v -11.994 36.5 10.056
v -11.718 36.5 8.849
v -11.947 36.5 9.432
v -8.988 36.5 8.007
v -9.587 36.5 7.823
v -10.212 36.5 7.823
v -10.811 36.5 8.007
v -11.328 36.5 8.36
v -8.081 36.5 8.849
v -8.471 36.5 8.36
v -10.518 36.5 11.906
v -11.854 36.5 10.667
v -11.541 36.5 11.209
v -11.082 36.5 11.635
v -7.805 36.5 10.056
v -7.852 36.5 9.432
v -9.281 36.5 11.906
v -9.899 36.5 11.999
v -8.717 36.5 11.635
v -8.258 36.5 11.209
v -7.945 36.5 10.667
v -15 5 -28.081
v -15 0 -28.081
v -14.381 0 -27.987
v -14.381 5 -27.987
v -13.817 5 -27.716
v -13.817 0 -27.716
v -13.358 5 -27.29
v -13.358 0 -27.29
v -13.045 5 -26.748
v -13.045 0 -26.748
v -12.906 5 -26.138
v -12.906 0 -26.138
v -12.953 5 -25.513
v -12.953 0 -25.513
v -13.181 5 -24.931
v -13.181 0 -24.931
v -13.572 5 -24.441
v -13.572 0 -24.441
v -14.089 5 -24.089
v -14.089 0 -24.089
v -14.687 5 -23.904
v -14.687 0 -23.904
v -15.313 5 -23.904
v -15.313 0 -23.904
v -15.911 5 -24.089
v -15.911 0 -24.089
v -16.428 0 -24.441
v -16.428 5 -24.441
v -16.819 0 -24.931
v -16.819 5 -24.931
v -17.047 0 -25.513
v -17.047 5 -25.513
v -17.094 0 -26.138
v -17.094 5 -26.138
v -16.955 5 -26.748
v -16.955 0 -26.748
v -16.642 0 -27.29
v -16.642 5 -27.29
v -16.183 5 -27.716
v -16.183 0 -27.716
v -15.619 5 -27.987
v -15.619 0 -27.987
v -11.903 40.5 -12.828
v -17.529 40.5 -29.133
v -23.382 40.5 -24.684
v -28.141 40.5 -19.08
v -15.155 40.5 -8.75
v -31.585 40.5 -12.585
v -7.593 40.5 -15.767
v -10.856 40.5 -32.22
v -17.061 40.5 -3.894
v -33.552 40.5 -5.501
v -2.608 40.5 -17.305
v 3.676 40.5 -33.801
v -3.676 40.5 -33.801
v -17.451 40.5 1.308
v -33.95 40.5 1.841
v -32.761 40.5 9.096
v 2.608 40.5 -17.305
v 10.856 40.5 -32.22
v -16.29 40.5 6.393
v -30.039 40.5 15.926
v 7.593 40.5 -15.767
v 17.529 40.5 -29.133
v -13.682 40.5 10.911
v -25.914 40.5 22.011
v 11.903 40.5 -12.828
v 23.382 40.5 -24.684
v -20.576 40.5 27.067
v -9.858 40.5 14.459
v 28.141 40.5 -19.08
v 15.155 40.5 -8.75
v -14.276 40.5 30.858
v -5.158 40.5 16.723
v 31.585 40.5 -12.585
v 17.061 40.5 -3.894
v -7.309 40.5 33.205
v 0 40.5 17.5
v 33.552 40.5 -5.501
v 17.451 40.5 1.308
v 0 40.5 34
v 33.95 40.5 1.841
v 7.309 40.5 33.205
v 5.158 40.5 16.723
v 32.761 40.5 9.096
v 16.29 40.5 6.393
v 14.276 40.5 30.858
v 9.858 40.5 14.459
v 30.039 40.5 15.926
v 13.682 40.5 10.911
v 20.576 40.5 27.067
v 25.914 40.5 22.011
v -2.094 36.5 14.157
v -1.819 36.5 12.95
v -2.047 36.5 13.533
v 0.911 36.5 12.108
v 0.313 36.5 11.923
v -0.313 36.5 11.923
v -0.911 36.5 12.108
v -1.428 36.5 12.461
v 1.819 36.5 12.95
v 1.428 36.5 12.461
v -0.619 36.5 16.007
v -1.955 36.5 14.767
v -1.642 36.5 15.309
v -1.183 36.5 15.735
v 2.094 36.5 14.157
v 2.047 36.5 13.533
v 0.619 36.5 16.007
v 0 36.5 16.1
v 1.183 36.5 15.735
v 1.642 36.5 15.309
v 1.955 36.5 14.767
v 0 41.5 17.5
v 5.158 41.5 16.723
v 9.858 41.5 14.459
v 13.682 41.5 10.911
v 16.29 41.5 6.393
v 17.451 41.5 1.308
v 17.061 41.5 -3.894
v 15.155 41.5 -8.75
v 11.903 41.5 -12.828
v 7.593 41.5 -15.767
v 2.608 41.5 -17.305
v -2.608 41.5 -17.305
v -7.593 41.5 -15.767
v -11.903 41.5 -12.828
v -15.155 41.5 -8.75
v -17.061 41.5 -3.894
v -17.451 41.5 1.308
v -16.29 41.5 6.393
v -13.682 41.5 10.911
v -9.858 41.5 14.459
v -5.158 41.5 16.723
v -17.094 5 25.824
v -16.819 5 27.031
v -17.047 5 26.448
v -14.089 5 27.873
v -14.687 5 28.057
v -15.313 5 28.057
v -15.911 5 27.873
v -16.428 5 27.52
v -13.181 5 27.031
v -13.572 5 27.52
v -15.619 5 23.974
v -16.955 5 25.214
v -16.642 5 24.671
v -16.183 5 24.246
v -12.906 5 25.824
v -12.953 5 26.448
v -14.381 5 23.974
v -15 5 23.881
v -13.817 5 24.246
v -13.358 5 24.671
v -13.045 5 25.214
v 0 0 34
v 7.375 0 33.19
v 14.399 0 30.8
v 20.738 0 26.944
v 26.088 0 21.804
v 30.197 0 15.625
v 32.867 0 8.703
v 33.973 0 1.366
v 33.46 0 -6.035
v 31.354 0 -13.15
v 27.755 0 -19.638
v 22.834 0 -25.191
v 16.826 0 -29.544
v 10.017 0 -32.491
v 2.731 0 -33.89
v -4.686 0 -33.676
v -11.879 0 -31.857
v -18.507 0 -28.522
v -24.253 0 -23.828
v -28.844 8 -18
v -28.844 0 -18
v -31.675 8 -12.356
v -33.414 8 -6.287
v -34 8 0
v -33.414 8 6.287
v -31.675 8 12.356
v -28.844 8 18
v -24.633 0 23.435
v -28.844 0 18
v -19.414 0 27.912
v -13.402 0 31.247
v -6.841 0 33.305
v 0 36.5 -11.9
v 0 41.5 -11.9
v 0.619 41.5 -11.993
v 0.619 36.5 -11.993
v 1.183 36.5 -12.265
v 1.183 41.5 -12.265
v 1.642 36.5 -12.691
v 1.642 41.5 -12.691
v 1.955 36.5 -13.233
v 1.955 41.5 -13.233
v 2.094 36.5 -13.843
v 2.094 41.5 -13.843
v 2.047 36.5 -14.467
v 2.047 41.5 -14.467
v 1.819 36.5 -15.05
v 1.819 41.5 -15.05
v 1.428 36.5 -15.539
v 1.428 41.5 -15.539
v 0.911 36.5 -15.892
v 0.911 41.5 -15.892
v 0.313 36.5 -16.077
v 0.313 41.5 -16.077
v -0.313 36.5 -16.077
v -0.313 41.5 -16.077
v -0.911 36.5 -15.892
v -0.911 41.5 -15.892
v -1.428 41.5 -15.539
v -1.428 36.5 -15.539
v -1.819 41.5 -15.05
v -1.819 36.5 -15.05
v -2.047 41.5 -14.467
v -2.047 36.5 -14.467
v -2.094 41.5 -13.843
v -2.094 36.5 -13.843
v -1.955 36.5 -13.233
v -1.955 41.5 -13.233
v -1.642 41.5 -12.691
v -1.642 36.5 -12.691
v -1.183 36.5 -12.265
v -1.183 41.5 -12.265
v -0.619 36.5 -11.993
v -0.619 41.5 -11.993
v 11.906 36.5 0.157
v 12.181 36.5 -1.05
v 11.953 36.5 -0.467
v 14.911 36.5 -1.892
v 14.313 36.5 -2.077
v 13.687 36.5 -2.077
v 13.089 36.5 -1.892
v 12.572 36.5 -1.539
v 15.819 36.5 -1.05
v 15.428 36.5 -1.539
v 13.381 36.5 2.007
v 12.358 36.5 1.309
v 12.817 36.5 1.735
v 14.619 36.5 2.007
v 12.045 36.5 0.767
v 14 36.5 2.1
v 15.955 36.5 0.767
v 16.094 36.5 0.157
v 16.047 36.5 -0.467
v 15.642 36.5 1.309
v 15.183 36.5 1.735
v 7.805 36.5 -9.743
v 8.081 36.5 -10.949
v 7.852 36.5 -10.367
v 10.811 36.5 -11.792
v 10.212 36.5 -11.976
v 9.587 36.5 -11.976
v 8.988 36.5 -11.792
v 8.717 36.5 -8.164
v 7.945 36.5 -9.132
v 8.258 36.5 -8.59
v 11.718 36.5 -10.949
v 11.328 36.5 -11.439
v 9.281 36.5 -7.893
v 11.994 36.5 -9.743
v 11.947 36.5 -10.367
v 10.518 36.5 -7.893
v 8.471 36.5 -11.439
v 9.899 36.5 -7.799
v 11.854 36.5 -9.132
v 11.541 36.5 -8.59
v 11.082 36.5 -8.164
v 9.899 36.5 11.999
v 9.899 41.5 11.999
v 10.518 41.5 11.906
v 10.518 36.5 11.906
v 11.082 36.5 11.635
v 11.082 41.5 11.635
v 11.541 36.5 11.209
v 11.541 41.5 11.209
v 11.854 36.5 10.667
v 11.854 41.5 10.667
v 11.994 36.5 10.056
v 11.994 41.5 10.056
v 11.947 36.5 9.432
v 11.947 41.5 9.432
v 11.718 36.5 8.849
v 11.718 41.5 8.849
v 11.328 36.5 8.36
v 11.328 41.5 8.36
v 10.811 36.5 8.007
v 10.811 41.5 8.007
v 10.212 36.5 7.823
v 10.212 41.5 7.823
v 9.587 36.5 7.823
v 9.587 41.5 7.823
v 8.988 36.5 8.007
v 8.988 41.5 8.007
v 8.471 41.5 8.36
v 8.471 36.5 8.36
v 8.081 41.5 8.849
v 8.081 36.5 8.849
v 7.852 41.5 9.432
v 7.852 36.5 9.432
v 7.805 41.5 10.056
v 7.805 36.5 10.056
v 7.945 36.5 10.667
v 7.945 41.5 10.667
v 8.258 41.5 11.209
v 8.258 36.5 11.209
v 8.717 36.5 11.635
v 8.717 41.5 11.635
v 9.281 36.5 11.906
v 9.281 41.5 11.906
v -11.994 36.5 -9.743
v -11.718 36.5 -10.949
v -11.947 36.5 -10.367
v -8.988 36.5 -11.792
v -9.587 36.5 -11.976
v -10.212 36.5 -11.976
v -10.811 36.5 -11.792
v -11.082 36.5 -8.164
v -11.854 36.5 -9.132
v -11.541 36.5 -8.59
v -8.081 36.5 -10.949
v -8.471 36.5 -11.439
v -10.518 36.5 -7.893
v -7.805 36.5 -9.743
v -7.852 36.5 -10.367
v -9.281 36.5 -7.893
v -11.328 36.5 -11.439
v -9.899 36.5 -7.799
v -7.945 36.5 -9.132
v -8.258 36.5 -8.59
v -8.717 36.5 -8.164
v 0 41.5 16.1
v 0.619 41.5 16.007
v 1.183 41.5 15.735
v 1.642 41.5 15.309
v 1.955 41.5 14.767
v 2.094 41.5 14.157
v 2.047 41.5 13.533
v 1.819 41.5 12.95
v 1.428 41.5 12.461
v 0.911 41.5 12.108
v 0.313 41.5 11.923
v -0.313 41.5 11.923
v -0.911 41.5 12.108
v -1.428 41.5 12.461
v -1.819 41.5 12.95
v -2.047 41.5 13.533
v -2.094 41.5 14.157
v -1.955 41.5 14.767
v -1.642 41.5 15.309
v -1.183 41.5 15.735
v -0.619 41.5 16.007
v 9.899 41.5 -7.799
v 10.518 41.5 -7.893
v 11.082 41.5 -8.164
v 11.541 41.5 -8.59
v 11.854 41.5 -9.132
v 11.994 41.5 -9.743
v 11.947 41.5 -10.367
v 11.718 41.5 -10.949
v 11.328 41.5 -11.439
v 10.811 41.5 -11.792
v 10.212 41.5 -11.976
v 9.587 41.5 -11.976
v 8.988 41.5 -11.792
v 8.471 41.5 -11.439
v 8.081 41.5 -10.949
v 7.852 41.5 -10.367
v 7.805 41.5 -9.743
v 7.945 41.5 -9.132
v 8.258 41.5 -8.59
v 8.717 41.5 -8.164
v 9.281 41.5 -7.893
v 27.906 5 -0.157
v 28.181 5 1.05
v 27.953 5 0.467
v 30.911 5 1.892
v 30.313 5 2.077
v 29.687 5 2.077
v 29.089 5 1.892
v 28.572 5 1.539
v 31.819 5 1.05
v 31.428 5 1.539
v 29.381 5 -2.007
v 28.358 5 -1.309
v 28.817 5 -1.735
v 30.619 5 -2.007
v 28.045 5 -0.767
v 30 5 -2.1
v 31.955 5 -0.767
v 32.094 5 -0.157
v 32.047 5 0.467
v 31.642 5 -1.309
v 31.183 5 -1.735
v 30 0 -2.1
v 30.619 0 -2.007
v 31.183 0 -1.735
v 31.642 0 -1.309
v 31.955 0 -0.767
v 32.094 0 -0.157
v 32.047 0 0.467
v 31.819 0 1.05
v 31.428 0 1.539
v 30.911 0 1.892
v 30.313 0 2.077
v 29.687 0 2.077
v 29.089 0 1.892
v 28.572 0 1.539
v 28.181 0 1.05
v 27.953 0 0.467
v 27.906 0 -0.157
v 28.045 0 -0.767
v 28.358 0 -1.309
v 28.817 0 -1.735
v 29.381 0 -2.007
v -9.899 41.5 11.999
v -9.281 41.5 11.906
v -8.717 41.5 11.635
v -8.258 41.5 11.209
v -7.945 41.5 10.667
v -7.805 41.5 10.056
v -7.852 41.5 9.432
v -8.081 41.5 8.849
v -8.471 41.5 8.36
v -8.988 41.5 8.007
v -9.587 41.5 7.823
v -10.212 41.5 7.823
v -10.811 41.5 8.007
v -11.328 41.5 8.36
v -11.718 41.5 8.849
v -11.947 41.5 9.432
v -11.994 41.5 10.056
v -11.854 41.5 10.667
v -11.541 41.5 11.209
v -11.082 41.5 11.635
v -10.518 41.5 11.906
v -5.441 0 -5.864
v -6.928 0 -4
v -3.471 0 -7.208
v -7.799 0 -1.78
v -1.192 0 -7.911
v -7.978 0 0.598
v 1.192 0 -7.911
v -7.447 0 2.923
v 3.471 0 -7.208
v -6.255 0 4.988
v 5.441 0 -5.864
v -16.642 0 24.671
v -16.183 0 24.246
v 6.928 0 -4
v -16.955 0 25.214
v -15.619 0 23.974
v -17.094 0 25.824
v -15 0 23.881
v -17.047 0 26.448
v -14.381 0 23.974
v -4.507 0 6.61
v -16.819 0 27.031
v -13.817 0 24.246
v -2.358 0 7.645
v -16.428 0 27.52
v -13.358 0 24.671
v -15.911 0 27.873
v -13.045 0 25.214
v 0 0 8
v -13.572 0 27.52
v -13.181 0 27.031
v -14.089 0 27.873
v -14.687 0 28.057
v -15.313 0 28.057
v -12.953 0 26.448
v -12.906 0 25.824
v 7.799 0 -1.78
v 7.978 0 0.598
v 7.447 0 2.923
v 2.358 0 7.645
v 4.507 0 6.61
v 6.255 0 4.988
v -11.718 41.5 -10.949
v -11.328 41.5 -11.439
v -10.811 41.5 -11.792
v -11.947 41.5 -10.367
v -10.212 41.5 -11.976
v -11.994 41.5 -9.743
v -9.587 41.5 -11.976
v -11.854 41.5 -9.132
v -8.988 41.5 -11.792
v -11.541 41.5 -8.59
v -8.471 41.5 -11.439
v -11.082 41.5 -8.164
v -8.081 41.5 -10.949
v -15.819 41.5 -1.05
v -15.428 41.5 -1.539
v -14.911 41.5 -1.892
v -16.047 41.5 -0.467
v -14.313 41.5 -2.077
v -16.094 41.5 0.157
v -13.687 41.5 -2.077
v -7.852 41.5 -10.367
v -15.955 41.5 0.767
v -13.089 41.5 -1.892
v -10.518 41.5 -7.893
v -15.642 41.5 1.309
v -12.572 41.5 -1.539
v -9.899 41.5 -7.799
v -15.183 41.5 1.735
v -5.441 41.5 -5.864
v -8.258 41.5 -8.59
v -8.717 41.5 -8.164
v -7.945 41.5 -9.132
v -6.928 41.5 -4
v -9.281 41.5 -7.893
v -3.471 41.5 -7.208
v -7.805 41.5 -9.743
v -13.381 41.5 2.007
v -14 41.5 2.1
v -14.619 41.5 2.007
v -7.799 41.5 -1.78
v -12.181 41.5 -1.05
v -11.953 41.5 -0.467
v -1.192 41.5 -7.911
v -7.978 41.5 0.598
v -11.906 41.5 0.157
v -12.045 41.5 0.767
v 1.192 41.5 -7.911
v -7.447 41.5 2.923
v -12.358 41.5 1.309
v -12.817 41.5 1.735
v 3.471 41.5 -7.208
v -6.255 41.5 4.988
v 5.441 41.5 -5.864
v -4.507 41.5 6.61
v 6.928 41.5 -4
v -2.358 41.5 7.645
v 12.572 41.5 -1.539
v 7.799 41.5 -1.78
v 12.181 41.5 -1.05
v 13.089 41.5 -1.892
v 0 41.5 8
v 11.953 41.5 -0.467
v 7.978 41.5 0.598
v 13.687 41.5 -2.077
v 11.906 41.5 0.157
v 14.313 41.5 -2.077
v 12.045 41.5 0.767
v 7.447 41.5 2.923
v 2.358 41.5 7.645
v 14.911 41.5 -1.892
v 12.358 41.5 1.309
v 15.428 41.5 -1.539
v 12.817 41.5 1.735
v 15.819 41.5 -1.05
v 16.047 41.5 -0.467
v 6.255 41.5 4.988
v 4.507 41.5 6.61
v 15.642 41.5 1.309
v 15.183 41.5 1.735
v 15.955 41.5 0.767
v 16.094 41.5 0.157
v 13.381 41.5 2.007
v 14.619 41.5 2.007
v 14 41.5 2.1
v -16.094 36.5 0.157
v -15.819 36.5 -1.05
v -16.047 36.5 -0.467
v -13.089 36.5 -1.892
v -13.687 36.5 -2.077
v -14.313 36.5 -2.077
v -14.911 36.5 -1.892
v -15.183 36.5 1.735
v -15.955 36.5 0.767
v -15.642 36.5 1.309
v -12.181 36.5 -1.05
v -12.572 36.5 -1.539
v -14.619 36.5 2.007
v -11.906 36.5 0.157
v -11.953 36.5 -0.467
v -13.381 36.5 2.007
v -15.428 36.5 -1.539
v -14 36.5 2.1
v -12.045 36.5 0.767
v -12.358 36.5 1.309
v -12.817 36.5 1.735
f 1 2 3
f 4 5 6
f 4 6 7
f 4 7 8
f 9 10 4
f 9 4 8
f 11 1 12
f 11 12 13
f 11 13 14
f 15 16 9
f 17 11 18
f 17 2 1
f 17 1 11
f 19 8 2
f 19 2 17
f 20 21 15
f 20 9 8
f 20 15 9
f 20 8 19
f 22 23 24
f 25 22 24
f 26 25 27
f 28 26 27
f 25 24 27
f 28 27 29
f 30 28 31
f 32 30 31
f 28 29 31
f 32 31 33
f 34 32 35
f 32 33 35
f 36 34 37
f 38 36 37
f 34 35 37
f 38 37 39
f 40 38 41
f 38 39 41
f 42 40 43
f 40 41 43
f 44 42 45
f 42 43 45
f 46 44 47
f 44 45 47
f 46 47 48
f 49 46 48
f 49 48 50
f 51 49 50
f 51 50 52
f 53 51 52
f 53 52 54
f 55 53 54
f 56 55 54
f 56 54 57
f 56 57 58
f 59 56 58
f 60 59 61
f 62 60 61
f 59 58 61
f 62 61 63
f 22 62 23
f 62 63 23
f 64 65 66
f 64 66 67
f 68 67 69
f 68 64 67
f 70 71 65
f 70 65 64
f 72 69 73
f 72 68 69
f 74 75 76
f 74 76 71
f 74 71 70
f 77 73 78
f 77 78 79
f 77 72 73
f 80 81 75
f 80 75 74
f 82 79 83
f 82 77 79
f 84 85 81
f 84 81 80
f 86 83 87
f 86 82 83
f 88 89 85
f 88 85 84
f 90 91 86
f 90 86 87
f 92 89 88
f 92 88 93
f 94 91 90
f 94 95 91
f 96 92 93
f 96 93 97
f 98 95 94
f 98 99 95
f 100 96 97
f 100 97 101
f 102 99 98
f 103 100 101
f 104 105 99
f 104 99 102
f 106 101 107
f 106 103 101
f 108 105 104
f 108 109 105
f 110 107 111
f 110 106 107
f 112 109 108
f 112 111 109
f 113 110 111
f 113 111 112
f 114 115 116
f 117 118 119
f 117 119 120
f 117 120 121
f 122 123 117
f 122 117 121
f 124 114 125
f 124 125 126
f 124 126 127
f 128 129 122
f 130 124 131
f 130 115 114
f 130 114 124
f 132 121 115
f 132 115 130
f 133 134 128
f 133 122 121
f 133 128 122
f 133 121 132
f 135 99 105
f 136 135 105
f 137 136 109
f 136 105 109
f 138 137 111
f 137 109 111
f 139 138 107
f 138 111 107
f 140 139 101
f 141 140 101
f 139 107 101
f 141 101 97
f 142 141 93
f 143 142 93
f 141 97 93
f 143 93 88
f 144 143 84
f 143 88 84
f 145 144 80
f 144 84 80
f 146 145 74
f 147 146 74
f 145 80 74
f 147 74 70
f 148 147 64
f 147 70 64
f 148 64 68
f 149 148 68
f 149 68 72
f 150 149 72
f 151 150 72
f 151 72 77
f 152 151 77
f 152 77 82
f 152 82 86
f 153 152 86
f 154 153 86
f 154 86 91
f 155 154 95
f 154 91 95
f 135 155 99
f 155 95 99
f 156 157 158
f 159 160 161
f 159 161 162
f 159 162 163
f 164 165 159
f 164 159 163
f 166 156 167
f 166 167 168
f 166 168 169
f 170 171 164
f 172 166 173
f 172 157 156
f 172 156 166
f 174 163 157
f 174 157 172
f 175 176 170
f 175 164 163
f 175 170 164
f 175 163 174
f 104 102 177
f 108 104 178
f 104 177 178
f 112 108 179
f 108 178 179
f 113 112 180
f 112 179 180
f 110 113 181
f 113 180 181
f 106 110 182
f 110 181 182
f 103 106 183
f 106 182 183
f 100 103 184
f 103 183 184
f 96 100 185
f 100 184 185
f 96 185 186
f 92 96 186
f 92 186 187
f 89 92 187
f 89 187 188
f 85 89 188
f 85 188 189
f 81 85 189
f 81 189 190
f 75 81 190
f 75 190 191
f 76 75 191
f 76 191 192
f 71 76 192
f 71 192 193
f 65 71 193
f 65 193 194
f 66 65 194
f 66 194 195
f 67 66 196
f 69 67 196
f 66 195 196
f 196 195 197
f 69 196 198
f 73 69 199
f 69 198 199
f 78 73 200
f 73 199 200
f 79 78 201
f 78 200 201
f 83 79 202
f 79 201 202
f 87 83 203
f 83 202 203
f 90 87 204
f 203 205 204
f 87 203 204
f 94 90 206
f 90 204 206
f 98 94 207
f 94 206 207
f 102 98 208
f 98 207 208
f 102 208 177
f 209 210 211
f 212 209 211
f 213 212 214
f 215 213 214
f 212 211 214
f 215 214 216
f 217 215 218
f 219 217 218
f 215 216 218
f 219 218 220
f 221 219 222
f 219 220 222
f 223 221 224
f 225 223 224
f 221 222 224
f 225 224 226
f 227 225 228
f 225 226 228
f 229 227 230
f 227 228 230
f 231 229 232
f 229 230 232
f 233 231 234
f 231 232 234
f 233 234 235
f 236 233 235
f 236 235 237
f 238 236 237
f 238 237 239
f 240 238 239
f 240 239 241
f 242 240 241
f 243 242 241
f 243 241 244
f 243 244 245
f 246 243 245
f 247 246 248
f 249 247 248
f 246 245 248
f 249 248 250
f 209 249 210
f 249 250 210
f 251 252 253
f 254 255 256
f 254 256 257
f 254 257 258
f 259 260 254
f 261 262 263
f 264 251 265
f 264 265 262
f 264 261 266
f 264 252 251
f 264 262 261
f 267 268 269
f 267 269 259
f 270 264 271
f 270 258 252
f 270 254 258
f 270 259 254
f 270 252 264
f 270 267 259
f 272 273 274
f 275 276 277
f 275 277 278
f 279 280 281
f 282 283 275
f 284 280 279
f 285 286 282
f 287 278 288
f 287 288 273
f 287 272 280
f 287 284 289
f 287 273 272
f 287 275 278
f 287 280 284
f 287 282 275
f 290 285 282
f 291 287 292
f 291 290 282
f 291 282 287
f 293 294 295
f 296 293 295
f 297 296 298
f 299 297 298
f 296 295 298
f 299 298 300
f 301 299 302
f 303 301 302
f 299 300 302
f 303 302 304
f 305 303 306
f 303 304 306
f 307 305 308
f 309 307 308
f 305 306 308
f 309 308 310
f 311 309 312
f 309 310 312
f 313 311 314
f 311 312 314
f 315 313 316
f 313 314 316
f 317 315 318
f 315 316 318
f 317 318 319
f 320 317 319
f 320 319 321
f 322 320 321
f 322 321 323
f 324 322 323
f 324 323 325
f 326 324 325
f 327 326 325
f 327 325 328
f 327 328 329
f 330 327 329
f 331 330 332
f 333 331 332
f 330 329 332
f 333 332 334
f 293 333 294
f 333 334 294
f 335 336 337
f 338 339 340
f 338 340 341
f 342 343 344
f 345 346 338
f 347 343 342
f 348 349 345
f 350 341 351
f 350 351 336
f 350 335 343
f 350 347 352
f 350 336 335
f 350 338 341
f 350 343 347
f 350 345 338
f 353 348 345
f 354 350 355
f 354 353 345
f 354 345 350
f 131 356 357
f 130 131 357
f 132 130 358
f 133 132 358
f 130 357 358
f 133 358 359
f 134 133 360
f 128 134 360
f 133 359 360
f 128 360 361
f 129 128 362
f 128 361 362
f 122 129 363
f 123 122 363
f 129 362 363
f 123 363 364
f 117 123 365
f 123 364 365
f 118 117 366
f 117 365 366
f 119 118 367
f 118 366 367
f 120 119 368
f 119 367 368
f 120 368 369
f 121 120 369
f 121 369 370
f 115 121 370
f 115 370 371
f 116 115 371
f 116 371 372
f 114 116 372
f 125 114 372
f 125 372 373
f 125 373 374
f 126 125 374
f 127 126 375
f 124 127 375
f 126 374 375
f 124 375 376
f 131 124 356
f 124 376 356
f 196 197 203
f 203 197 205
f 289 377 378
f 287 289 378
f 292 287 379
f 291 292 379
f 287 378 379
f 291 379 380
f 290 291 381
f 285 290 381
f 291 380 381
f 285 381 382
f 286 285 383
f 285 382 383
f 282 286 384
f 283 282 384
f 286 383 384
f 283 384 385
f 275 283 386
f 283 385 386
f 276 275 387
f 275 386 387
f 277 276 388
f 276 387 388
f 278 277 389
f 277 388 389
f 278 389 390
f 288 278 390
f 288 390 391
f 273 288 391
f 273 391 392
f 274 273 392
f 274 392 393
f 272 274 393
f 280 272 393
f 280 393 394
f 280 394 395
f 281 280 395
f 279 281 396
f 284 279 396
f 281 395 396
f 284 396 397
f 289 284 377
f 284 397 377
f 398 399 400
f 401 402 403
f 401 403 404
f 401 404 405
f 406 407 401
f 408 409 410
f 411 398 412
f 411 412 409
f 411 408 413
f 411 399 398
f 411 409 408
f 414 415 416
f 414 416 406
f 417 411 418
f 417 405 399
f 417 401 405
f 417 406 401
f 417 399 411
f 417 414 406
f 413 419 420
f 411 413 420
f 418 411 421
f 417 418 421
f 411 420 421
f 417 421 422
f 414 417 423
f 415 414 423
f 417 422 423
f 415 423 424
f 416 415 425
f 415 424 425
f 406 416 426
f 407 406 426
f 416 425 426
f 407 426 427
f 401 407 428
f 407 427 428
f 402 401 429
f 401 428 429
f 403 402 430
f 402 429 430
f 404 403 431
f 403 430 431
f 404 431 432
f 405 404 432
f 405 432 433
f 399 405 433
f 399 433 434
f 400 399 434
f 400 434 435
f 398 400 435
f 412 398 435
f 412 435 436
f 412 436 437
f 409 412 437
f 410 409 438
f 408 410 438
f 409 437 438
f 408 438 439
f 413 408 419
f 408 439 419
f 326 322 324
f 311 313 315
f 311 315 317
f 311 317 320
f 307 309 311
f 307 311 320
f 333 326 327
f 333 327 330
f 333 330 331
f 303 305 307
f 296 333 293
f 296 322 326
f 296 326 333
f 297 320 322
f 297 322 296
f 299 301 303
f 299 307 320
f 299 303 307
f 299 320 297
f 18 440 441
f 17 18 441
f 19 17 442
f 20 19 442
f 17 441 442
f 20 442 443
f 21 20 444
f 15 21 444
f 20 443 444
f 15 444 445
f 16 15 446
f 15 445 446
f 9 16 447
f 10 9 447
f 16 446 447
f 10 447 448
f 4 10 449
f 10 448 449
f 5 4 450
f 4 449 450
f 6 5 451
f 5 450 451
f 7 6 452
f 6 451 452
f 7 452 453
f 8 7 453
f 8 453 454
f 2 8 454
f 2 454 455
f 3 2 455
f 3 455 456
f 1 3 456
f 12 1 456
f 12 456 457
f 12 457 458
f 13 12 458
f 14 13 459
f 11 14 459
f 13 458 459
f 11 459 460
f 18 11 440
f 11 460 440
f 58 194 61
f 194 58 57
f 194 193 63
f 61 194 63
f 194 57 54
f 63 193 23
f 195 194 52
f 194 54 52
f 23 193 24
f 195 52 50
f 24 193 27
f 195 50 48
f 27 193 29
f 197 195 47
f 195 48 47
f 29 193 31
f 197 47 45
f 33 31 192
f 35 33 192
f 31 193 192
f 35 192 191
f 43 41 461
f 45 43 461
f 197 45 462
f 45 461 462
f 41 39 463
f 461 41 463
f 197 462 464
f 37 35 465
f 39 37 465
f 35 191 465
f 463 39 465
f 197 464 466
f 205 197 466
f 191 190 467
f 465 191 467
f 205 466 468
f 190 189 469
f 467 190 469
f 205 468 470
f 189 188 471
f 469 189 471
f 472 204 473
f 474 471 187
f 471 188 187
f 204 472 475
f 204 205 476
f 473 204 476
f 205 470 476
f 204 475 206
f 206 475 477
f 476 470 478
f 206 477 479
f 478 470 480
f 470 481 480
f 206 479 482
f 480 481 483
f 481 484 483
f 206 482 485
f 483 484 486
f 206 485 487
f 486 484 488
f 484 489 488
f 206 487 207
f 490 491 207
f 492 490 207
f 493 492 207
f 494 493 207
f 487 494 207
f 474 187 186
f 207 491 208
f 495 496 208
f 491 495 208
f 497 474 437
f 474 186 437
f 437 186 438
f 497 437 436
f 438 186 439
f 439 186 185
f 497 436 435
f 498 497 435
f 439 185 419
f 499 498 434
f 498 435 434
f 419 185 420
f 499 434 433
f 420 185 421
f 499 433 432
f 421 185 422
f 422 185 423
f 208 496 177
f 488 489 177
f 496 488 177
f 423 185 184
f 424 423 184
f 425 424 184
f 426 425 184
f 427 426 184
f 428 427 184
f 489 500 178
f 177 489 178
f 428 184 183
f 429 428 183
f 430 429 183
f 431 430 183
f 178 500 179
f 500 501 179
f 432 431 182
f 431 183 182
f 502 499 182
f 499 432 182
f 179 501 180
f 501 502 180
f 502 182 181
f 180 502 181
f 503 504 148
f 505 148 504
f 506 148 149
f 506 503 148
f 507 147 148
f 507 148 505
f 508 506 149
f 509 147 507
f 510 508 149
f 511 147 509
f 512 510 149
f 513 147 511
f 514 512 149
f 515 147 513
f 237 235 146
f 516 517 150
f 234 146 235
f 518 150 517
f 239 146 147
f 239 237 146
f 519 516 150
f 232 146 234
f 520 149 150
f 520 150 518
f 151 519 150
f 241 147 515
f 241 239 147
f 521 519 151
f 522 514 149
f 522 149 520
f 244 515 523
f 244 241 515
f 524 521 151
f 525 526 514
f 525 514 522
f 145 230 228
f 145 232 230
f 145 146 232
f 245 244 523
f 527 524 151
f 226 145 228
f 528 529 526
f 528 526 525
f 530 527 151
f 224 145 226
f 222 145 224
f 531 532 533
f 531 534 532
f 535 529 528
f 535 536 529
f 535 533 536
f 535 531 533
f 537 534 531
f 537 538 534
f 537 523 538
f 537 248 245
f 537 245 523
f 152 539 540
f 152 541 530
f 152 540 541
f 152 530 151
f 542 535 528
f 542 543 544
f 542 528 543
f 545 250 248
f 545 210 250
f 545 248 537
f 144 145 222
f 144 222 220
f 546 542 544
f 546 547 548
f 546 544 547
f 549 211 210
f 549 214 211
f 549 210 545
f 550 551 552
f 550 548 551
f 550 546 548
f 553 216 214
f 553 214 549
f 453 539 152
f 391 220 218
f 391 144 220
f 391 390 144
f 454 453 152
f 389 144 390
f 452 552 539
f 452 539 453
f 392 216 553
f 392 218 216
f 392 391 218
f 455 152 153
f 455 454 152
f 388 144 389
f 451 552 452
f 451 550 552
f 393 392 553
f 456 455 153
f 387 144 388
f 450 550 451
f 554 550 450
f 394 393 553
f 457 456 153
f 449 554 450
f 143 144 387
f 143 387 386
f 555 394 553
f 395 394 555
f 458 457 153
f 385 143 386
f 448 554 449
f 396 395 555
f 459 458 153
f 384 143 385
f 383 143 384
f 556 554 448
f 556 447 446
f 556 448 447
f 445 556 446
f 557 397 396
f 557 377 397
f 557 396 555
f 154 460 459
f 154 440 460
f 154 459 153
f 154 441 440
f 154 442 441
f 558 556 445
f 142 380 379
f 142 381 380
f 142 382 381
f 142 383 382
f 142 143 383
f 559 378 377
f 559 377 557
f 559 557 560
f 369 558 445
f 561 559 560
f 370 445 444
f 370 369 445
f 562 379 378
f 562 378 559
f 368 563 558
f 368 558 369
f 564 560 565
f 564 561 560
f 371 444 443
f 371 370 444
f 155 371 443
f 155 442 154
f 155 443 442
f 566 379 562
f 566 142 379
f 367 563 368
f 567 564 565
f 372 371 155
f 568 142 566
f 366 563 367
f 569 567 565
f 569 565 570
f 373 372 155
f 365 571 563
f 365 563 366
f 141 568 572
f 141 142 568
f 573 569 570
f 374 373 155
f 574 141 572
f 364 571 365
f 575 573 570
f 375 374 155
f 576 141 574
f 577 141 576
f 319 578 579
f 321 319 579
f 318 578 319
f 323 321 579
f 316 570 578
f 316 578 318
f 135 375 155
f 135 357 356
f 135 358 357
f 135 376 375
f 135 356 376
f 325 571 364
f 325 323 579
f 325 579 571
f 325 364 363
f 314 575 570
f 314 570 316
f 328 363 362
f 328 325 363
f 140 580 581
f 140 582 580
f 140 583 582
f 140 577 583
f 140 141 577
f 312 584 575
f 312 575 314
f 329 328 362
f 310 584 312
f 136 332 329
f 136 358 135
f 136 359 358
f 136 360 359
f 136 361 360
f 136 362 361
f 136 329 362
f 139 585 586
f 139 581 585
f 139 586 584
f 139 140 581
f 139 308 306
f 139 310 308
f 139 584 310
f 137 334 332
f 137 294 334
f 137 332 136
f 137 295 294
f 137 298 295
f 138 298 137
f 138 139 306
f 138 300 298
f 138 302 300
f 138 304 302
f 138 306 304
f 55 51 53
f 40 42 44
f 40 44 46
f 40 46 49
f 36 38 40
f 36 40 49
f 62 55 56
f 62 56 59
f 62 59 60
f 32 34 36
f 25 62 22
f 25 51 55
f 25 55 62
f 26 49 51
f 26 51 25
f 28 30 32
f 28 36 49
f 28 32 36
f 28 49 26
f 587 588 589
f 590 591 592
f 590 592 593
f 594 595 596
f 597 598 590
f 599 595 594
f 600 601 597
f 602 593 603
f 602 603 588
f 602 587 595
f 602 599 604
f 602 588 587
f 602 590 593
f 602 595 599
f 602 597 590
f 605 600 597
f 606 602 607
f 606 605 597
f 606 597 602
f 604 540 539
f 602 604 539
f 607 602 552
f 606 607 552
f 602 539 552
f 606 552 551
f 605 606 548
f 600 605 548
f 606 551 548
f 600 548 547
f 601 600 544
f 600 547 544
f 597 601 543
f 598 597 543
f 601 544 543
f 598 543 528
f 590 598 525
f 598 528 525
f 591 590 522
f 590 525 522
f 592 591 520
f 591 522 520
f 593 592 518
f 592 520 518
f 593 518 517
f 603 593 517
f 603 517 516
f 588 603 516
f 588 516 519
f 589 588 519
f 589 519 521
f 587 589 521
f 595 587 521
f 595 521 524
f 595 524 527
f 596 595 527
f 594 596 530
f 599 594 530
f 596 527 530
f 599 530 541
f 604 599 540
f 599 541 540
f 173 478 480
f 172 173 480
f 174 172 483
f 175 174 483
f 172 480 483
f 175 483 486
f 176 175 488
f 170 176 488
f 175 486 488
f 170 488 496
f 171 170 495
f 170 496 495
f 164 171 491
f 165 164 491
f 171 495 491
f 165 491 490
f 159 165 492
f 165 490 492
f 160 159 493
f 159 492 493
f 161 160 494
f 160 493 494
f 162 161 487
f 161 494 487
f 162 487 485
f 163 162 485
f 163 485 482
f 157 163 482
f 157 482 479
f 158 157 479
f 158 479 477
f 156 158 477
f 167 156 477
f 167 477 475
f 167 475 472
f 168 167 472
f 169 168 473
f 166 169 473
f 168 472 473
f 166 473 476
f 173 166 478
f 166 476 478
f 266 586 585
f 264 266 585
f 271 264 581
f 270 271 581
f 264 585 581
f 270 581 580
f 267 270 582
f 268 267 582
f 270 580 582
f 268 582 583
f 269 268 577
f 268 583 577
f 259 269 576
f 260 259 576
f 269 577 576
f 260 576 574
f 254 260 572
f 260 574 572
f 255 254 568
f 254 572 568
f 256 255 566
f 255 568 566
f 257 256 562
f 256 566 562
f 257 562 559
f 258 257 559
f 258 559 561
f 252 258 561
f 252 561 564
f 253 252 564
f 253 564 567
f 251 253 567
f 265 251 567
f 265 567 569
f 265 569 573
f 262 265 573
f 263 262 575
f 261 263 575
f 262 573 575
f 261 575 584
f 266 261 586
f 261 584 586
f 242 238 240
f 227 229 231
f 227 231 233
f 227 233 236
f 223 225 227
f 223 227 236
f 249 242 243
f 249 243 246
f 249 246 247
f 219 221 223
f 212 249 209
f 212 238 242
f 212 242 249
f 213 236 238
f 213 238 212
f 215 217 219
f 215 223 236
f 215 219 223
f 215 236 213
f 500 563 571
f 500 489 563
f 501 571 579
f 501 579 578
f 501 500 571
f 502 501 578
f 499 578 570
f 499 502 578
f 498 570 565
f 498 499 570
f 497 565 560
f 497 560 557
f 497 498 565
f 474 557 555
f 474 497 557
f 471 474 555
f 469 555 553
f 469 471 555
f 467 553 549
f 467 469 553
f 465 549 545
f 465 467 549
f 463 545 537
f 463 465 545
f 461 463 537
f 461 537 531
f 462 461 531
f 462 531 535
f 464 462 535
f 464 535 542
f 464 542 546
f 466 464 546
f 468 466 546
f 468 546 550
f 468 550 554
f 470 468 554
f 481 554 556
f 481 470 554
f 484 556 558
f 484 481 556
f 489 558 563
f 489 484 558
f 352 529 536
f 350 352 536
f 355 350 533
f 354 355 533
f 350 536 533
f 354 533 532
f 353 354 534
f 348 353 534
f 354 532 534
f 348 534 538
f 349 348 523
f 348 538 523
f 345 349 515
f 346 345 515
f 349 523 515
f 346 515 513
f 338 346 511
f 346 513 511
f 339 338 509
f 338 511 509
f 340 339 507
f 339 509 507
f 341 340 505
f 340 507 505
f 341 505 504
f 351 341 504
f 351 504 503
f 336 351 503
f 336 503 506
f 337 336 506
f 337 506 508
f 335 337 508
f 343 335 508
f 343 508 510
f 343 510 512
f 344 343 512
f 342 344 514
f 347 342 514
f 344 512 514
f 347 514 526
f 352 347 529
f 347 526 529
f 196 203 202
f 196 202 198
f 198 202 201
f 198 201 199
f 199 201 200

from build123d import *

# Parameters (mm, degrees)
SKETCH_1_R          = 34
SKETCH_1_R_2        = 8
EXTRUDE_1_DEPTH     = 40.5
SKETCH_2_R          = 17.5
SKETCH_2_R_2        = 8
EXTRUDE_2_DEPTH     = 1
SKETCH_3_R          = 2.1
CUT_EXTRUDE_1_DEPTH = 5
CUT_EXTRUDE_2_DEPTH = 8
SKETCH_5_R          = 2.1
CUT_EXTRUDE_3_DEPTH = 5


with BuildPart() as part:
    # 草图1 → 凸台-拉伸1 (new body)
    with BuildSketch(Plane(origin=(0, 0, 0), x_dir=(1, 0, 0), z_dir=(0, 1, 0))):
        with Locations(Location((0, 0, 0), (0, 0, 270))):
            Circle(SKETCH_1_R)
        with Locations(Location((0, 0, 0), (0, 0, 270))):
            Circle(SKETCH_1_R_2, mode=Mode.SUBTRACT)
    extrude(amount=EXTRUDE_1_DEPTH)

    # 草图2 → 凸台-拉伸2 (add)
    with BuildSketch(Plane(origin=(0, 40.5, 0), x_dir=(1, 0, 0), z_dir=(0, 1, 0))):
        with Locations(Location((0, 0, 0), (0, 0, 270))):
            Circle(SKETCH_2_R)
        with Locations(Location((0, 0, 0), (0, 0, 270))):
            Circle(SKETCH_2_R_2, mode=Mode.SUBTRACT)
    extrude(amount=EXTRUDE_2_DEPTH)

    # 草图3 → 切除-拉伸1 (cut)
    with BuildSketch(Plane(origin=(0, 41.5, 0), x_dir=(1, 0, 0), z_dir=(0, 1, 0))):
        with Locations(Location((14, 0, 0), (0, 0, 270))):
            Circle(SKETCH_3_R)
        with Locations(Location((9.899494937, -9.899494937, 0), (0, 0, 270))):
            Circle(SKETCH_3_R)
        with Locations(Location((0, -14, 0), (0, 0, 270))):
            Circle(SKETCH_3_R)
        with Locations(Location((-9.899494937, -9.899494937, 0), (0, 0, 270))):
            Circle(SKETCH_3_R)
        with Locations(Location((-14, 0, 0), (0, 0, 270))):
            Circle(SKETCH_3_R)
        with Locations(Location((-9.899494937, 9.899494937, 0), (0, 0, 270))):
            Circle(SKETCH_3_R)
        with Locations(Location((0, 14, 0), (0, 0, 270))):
            Circle(SKETCH_3_R)
        with Locations(Location((9.899494937, 9.899494937, 0), (0, 0, 270))):
            Circle(SKETCH_3_R)
    extrude(amount=-CUT_EXTRUDE_1_DEPTH, mode=Mode.SUBTRACT)

    # 草图4 → 切除-拉伸2 (cut)
    with BuildSketch(Plane(origin=(0, 0, 0), x_dir=(-1, 0, 0), z_dir=(0, -1, 0))):
        Polygon((28.844410204, 191.136996342), (28.844410204, 18), (28.844410204, -18), (28.844410204, -191.136996342), (375.118402887, -191.136996342), (375.118402887, 191.136996342), align=None)
    extrude(amount=-CUT_EXTRUDE_2_DEPTH, mode=Mode.SUBTRACT)

    # 草图5 → 切除-拉伸3 (cut)
    with BuildSketch(Plane(origin=(0, 0, 0), x_dir=(-1, 0, 0), z_dir=(0, -1, 0))):
        with Locations(Location((-30, 0, 0), (0, 0, 90))):
            Circle(SKETCH_5_R)
        with Locations(Location((15, 25.980762114, 0), (0, 0, 90))):
            Circle(SKETCH_5_R)
        with Locations(Location((15, -25.980762114, 0), (0, 0, 90))):
            Circle(SKETCH_5_R)
    extrude(amount=-CUT_EXTRUDE_3_DEPTH, mode=Mode.SUBTRACT)


solid = part.part
